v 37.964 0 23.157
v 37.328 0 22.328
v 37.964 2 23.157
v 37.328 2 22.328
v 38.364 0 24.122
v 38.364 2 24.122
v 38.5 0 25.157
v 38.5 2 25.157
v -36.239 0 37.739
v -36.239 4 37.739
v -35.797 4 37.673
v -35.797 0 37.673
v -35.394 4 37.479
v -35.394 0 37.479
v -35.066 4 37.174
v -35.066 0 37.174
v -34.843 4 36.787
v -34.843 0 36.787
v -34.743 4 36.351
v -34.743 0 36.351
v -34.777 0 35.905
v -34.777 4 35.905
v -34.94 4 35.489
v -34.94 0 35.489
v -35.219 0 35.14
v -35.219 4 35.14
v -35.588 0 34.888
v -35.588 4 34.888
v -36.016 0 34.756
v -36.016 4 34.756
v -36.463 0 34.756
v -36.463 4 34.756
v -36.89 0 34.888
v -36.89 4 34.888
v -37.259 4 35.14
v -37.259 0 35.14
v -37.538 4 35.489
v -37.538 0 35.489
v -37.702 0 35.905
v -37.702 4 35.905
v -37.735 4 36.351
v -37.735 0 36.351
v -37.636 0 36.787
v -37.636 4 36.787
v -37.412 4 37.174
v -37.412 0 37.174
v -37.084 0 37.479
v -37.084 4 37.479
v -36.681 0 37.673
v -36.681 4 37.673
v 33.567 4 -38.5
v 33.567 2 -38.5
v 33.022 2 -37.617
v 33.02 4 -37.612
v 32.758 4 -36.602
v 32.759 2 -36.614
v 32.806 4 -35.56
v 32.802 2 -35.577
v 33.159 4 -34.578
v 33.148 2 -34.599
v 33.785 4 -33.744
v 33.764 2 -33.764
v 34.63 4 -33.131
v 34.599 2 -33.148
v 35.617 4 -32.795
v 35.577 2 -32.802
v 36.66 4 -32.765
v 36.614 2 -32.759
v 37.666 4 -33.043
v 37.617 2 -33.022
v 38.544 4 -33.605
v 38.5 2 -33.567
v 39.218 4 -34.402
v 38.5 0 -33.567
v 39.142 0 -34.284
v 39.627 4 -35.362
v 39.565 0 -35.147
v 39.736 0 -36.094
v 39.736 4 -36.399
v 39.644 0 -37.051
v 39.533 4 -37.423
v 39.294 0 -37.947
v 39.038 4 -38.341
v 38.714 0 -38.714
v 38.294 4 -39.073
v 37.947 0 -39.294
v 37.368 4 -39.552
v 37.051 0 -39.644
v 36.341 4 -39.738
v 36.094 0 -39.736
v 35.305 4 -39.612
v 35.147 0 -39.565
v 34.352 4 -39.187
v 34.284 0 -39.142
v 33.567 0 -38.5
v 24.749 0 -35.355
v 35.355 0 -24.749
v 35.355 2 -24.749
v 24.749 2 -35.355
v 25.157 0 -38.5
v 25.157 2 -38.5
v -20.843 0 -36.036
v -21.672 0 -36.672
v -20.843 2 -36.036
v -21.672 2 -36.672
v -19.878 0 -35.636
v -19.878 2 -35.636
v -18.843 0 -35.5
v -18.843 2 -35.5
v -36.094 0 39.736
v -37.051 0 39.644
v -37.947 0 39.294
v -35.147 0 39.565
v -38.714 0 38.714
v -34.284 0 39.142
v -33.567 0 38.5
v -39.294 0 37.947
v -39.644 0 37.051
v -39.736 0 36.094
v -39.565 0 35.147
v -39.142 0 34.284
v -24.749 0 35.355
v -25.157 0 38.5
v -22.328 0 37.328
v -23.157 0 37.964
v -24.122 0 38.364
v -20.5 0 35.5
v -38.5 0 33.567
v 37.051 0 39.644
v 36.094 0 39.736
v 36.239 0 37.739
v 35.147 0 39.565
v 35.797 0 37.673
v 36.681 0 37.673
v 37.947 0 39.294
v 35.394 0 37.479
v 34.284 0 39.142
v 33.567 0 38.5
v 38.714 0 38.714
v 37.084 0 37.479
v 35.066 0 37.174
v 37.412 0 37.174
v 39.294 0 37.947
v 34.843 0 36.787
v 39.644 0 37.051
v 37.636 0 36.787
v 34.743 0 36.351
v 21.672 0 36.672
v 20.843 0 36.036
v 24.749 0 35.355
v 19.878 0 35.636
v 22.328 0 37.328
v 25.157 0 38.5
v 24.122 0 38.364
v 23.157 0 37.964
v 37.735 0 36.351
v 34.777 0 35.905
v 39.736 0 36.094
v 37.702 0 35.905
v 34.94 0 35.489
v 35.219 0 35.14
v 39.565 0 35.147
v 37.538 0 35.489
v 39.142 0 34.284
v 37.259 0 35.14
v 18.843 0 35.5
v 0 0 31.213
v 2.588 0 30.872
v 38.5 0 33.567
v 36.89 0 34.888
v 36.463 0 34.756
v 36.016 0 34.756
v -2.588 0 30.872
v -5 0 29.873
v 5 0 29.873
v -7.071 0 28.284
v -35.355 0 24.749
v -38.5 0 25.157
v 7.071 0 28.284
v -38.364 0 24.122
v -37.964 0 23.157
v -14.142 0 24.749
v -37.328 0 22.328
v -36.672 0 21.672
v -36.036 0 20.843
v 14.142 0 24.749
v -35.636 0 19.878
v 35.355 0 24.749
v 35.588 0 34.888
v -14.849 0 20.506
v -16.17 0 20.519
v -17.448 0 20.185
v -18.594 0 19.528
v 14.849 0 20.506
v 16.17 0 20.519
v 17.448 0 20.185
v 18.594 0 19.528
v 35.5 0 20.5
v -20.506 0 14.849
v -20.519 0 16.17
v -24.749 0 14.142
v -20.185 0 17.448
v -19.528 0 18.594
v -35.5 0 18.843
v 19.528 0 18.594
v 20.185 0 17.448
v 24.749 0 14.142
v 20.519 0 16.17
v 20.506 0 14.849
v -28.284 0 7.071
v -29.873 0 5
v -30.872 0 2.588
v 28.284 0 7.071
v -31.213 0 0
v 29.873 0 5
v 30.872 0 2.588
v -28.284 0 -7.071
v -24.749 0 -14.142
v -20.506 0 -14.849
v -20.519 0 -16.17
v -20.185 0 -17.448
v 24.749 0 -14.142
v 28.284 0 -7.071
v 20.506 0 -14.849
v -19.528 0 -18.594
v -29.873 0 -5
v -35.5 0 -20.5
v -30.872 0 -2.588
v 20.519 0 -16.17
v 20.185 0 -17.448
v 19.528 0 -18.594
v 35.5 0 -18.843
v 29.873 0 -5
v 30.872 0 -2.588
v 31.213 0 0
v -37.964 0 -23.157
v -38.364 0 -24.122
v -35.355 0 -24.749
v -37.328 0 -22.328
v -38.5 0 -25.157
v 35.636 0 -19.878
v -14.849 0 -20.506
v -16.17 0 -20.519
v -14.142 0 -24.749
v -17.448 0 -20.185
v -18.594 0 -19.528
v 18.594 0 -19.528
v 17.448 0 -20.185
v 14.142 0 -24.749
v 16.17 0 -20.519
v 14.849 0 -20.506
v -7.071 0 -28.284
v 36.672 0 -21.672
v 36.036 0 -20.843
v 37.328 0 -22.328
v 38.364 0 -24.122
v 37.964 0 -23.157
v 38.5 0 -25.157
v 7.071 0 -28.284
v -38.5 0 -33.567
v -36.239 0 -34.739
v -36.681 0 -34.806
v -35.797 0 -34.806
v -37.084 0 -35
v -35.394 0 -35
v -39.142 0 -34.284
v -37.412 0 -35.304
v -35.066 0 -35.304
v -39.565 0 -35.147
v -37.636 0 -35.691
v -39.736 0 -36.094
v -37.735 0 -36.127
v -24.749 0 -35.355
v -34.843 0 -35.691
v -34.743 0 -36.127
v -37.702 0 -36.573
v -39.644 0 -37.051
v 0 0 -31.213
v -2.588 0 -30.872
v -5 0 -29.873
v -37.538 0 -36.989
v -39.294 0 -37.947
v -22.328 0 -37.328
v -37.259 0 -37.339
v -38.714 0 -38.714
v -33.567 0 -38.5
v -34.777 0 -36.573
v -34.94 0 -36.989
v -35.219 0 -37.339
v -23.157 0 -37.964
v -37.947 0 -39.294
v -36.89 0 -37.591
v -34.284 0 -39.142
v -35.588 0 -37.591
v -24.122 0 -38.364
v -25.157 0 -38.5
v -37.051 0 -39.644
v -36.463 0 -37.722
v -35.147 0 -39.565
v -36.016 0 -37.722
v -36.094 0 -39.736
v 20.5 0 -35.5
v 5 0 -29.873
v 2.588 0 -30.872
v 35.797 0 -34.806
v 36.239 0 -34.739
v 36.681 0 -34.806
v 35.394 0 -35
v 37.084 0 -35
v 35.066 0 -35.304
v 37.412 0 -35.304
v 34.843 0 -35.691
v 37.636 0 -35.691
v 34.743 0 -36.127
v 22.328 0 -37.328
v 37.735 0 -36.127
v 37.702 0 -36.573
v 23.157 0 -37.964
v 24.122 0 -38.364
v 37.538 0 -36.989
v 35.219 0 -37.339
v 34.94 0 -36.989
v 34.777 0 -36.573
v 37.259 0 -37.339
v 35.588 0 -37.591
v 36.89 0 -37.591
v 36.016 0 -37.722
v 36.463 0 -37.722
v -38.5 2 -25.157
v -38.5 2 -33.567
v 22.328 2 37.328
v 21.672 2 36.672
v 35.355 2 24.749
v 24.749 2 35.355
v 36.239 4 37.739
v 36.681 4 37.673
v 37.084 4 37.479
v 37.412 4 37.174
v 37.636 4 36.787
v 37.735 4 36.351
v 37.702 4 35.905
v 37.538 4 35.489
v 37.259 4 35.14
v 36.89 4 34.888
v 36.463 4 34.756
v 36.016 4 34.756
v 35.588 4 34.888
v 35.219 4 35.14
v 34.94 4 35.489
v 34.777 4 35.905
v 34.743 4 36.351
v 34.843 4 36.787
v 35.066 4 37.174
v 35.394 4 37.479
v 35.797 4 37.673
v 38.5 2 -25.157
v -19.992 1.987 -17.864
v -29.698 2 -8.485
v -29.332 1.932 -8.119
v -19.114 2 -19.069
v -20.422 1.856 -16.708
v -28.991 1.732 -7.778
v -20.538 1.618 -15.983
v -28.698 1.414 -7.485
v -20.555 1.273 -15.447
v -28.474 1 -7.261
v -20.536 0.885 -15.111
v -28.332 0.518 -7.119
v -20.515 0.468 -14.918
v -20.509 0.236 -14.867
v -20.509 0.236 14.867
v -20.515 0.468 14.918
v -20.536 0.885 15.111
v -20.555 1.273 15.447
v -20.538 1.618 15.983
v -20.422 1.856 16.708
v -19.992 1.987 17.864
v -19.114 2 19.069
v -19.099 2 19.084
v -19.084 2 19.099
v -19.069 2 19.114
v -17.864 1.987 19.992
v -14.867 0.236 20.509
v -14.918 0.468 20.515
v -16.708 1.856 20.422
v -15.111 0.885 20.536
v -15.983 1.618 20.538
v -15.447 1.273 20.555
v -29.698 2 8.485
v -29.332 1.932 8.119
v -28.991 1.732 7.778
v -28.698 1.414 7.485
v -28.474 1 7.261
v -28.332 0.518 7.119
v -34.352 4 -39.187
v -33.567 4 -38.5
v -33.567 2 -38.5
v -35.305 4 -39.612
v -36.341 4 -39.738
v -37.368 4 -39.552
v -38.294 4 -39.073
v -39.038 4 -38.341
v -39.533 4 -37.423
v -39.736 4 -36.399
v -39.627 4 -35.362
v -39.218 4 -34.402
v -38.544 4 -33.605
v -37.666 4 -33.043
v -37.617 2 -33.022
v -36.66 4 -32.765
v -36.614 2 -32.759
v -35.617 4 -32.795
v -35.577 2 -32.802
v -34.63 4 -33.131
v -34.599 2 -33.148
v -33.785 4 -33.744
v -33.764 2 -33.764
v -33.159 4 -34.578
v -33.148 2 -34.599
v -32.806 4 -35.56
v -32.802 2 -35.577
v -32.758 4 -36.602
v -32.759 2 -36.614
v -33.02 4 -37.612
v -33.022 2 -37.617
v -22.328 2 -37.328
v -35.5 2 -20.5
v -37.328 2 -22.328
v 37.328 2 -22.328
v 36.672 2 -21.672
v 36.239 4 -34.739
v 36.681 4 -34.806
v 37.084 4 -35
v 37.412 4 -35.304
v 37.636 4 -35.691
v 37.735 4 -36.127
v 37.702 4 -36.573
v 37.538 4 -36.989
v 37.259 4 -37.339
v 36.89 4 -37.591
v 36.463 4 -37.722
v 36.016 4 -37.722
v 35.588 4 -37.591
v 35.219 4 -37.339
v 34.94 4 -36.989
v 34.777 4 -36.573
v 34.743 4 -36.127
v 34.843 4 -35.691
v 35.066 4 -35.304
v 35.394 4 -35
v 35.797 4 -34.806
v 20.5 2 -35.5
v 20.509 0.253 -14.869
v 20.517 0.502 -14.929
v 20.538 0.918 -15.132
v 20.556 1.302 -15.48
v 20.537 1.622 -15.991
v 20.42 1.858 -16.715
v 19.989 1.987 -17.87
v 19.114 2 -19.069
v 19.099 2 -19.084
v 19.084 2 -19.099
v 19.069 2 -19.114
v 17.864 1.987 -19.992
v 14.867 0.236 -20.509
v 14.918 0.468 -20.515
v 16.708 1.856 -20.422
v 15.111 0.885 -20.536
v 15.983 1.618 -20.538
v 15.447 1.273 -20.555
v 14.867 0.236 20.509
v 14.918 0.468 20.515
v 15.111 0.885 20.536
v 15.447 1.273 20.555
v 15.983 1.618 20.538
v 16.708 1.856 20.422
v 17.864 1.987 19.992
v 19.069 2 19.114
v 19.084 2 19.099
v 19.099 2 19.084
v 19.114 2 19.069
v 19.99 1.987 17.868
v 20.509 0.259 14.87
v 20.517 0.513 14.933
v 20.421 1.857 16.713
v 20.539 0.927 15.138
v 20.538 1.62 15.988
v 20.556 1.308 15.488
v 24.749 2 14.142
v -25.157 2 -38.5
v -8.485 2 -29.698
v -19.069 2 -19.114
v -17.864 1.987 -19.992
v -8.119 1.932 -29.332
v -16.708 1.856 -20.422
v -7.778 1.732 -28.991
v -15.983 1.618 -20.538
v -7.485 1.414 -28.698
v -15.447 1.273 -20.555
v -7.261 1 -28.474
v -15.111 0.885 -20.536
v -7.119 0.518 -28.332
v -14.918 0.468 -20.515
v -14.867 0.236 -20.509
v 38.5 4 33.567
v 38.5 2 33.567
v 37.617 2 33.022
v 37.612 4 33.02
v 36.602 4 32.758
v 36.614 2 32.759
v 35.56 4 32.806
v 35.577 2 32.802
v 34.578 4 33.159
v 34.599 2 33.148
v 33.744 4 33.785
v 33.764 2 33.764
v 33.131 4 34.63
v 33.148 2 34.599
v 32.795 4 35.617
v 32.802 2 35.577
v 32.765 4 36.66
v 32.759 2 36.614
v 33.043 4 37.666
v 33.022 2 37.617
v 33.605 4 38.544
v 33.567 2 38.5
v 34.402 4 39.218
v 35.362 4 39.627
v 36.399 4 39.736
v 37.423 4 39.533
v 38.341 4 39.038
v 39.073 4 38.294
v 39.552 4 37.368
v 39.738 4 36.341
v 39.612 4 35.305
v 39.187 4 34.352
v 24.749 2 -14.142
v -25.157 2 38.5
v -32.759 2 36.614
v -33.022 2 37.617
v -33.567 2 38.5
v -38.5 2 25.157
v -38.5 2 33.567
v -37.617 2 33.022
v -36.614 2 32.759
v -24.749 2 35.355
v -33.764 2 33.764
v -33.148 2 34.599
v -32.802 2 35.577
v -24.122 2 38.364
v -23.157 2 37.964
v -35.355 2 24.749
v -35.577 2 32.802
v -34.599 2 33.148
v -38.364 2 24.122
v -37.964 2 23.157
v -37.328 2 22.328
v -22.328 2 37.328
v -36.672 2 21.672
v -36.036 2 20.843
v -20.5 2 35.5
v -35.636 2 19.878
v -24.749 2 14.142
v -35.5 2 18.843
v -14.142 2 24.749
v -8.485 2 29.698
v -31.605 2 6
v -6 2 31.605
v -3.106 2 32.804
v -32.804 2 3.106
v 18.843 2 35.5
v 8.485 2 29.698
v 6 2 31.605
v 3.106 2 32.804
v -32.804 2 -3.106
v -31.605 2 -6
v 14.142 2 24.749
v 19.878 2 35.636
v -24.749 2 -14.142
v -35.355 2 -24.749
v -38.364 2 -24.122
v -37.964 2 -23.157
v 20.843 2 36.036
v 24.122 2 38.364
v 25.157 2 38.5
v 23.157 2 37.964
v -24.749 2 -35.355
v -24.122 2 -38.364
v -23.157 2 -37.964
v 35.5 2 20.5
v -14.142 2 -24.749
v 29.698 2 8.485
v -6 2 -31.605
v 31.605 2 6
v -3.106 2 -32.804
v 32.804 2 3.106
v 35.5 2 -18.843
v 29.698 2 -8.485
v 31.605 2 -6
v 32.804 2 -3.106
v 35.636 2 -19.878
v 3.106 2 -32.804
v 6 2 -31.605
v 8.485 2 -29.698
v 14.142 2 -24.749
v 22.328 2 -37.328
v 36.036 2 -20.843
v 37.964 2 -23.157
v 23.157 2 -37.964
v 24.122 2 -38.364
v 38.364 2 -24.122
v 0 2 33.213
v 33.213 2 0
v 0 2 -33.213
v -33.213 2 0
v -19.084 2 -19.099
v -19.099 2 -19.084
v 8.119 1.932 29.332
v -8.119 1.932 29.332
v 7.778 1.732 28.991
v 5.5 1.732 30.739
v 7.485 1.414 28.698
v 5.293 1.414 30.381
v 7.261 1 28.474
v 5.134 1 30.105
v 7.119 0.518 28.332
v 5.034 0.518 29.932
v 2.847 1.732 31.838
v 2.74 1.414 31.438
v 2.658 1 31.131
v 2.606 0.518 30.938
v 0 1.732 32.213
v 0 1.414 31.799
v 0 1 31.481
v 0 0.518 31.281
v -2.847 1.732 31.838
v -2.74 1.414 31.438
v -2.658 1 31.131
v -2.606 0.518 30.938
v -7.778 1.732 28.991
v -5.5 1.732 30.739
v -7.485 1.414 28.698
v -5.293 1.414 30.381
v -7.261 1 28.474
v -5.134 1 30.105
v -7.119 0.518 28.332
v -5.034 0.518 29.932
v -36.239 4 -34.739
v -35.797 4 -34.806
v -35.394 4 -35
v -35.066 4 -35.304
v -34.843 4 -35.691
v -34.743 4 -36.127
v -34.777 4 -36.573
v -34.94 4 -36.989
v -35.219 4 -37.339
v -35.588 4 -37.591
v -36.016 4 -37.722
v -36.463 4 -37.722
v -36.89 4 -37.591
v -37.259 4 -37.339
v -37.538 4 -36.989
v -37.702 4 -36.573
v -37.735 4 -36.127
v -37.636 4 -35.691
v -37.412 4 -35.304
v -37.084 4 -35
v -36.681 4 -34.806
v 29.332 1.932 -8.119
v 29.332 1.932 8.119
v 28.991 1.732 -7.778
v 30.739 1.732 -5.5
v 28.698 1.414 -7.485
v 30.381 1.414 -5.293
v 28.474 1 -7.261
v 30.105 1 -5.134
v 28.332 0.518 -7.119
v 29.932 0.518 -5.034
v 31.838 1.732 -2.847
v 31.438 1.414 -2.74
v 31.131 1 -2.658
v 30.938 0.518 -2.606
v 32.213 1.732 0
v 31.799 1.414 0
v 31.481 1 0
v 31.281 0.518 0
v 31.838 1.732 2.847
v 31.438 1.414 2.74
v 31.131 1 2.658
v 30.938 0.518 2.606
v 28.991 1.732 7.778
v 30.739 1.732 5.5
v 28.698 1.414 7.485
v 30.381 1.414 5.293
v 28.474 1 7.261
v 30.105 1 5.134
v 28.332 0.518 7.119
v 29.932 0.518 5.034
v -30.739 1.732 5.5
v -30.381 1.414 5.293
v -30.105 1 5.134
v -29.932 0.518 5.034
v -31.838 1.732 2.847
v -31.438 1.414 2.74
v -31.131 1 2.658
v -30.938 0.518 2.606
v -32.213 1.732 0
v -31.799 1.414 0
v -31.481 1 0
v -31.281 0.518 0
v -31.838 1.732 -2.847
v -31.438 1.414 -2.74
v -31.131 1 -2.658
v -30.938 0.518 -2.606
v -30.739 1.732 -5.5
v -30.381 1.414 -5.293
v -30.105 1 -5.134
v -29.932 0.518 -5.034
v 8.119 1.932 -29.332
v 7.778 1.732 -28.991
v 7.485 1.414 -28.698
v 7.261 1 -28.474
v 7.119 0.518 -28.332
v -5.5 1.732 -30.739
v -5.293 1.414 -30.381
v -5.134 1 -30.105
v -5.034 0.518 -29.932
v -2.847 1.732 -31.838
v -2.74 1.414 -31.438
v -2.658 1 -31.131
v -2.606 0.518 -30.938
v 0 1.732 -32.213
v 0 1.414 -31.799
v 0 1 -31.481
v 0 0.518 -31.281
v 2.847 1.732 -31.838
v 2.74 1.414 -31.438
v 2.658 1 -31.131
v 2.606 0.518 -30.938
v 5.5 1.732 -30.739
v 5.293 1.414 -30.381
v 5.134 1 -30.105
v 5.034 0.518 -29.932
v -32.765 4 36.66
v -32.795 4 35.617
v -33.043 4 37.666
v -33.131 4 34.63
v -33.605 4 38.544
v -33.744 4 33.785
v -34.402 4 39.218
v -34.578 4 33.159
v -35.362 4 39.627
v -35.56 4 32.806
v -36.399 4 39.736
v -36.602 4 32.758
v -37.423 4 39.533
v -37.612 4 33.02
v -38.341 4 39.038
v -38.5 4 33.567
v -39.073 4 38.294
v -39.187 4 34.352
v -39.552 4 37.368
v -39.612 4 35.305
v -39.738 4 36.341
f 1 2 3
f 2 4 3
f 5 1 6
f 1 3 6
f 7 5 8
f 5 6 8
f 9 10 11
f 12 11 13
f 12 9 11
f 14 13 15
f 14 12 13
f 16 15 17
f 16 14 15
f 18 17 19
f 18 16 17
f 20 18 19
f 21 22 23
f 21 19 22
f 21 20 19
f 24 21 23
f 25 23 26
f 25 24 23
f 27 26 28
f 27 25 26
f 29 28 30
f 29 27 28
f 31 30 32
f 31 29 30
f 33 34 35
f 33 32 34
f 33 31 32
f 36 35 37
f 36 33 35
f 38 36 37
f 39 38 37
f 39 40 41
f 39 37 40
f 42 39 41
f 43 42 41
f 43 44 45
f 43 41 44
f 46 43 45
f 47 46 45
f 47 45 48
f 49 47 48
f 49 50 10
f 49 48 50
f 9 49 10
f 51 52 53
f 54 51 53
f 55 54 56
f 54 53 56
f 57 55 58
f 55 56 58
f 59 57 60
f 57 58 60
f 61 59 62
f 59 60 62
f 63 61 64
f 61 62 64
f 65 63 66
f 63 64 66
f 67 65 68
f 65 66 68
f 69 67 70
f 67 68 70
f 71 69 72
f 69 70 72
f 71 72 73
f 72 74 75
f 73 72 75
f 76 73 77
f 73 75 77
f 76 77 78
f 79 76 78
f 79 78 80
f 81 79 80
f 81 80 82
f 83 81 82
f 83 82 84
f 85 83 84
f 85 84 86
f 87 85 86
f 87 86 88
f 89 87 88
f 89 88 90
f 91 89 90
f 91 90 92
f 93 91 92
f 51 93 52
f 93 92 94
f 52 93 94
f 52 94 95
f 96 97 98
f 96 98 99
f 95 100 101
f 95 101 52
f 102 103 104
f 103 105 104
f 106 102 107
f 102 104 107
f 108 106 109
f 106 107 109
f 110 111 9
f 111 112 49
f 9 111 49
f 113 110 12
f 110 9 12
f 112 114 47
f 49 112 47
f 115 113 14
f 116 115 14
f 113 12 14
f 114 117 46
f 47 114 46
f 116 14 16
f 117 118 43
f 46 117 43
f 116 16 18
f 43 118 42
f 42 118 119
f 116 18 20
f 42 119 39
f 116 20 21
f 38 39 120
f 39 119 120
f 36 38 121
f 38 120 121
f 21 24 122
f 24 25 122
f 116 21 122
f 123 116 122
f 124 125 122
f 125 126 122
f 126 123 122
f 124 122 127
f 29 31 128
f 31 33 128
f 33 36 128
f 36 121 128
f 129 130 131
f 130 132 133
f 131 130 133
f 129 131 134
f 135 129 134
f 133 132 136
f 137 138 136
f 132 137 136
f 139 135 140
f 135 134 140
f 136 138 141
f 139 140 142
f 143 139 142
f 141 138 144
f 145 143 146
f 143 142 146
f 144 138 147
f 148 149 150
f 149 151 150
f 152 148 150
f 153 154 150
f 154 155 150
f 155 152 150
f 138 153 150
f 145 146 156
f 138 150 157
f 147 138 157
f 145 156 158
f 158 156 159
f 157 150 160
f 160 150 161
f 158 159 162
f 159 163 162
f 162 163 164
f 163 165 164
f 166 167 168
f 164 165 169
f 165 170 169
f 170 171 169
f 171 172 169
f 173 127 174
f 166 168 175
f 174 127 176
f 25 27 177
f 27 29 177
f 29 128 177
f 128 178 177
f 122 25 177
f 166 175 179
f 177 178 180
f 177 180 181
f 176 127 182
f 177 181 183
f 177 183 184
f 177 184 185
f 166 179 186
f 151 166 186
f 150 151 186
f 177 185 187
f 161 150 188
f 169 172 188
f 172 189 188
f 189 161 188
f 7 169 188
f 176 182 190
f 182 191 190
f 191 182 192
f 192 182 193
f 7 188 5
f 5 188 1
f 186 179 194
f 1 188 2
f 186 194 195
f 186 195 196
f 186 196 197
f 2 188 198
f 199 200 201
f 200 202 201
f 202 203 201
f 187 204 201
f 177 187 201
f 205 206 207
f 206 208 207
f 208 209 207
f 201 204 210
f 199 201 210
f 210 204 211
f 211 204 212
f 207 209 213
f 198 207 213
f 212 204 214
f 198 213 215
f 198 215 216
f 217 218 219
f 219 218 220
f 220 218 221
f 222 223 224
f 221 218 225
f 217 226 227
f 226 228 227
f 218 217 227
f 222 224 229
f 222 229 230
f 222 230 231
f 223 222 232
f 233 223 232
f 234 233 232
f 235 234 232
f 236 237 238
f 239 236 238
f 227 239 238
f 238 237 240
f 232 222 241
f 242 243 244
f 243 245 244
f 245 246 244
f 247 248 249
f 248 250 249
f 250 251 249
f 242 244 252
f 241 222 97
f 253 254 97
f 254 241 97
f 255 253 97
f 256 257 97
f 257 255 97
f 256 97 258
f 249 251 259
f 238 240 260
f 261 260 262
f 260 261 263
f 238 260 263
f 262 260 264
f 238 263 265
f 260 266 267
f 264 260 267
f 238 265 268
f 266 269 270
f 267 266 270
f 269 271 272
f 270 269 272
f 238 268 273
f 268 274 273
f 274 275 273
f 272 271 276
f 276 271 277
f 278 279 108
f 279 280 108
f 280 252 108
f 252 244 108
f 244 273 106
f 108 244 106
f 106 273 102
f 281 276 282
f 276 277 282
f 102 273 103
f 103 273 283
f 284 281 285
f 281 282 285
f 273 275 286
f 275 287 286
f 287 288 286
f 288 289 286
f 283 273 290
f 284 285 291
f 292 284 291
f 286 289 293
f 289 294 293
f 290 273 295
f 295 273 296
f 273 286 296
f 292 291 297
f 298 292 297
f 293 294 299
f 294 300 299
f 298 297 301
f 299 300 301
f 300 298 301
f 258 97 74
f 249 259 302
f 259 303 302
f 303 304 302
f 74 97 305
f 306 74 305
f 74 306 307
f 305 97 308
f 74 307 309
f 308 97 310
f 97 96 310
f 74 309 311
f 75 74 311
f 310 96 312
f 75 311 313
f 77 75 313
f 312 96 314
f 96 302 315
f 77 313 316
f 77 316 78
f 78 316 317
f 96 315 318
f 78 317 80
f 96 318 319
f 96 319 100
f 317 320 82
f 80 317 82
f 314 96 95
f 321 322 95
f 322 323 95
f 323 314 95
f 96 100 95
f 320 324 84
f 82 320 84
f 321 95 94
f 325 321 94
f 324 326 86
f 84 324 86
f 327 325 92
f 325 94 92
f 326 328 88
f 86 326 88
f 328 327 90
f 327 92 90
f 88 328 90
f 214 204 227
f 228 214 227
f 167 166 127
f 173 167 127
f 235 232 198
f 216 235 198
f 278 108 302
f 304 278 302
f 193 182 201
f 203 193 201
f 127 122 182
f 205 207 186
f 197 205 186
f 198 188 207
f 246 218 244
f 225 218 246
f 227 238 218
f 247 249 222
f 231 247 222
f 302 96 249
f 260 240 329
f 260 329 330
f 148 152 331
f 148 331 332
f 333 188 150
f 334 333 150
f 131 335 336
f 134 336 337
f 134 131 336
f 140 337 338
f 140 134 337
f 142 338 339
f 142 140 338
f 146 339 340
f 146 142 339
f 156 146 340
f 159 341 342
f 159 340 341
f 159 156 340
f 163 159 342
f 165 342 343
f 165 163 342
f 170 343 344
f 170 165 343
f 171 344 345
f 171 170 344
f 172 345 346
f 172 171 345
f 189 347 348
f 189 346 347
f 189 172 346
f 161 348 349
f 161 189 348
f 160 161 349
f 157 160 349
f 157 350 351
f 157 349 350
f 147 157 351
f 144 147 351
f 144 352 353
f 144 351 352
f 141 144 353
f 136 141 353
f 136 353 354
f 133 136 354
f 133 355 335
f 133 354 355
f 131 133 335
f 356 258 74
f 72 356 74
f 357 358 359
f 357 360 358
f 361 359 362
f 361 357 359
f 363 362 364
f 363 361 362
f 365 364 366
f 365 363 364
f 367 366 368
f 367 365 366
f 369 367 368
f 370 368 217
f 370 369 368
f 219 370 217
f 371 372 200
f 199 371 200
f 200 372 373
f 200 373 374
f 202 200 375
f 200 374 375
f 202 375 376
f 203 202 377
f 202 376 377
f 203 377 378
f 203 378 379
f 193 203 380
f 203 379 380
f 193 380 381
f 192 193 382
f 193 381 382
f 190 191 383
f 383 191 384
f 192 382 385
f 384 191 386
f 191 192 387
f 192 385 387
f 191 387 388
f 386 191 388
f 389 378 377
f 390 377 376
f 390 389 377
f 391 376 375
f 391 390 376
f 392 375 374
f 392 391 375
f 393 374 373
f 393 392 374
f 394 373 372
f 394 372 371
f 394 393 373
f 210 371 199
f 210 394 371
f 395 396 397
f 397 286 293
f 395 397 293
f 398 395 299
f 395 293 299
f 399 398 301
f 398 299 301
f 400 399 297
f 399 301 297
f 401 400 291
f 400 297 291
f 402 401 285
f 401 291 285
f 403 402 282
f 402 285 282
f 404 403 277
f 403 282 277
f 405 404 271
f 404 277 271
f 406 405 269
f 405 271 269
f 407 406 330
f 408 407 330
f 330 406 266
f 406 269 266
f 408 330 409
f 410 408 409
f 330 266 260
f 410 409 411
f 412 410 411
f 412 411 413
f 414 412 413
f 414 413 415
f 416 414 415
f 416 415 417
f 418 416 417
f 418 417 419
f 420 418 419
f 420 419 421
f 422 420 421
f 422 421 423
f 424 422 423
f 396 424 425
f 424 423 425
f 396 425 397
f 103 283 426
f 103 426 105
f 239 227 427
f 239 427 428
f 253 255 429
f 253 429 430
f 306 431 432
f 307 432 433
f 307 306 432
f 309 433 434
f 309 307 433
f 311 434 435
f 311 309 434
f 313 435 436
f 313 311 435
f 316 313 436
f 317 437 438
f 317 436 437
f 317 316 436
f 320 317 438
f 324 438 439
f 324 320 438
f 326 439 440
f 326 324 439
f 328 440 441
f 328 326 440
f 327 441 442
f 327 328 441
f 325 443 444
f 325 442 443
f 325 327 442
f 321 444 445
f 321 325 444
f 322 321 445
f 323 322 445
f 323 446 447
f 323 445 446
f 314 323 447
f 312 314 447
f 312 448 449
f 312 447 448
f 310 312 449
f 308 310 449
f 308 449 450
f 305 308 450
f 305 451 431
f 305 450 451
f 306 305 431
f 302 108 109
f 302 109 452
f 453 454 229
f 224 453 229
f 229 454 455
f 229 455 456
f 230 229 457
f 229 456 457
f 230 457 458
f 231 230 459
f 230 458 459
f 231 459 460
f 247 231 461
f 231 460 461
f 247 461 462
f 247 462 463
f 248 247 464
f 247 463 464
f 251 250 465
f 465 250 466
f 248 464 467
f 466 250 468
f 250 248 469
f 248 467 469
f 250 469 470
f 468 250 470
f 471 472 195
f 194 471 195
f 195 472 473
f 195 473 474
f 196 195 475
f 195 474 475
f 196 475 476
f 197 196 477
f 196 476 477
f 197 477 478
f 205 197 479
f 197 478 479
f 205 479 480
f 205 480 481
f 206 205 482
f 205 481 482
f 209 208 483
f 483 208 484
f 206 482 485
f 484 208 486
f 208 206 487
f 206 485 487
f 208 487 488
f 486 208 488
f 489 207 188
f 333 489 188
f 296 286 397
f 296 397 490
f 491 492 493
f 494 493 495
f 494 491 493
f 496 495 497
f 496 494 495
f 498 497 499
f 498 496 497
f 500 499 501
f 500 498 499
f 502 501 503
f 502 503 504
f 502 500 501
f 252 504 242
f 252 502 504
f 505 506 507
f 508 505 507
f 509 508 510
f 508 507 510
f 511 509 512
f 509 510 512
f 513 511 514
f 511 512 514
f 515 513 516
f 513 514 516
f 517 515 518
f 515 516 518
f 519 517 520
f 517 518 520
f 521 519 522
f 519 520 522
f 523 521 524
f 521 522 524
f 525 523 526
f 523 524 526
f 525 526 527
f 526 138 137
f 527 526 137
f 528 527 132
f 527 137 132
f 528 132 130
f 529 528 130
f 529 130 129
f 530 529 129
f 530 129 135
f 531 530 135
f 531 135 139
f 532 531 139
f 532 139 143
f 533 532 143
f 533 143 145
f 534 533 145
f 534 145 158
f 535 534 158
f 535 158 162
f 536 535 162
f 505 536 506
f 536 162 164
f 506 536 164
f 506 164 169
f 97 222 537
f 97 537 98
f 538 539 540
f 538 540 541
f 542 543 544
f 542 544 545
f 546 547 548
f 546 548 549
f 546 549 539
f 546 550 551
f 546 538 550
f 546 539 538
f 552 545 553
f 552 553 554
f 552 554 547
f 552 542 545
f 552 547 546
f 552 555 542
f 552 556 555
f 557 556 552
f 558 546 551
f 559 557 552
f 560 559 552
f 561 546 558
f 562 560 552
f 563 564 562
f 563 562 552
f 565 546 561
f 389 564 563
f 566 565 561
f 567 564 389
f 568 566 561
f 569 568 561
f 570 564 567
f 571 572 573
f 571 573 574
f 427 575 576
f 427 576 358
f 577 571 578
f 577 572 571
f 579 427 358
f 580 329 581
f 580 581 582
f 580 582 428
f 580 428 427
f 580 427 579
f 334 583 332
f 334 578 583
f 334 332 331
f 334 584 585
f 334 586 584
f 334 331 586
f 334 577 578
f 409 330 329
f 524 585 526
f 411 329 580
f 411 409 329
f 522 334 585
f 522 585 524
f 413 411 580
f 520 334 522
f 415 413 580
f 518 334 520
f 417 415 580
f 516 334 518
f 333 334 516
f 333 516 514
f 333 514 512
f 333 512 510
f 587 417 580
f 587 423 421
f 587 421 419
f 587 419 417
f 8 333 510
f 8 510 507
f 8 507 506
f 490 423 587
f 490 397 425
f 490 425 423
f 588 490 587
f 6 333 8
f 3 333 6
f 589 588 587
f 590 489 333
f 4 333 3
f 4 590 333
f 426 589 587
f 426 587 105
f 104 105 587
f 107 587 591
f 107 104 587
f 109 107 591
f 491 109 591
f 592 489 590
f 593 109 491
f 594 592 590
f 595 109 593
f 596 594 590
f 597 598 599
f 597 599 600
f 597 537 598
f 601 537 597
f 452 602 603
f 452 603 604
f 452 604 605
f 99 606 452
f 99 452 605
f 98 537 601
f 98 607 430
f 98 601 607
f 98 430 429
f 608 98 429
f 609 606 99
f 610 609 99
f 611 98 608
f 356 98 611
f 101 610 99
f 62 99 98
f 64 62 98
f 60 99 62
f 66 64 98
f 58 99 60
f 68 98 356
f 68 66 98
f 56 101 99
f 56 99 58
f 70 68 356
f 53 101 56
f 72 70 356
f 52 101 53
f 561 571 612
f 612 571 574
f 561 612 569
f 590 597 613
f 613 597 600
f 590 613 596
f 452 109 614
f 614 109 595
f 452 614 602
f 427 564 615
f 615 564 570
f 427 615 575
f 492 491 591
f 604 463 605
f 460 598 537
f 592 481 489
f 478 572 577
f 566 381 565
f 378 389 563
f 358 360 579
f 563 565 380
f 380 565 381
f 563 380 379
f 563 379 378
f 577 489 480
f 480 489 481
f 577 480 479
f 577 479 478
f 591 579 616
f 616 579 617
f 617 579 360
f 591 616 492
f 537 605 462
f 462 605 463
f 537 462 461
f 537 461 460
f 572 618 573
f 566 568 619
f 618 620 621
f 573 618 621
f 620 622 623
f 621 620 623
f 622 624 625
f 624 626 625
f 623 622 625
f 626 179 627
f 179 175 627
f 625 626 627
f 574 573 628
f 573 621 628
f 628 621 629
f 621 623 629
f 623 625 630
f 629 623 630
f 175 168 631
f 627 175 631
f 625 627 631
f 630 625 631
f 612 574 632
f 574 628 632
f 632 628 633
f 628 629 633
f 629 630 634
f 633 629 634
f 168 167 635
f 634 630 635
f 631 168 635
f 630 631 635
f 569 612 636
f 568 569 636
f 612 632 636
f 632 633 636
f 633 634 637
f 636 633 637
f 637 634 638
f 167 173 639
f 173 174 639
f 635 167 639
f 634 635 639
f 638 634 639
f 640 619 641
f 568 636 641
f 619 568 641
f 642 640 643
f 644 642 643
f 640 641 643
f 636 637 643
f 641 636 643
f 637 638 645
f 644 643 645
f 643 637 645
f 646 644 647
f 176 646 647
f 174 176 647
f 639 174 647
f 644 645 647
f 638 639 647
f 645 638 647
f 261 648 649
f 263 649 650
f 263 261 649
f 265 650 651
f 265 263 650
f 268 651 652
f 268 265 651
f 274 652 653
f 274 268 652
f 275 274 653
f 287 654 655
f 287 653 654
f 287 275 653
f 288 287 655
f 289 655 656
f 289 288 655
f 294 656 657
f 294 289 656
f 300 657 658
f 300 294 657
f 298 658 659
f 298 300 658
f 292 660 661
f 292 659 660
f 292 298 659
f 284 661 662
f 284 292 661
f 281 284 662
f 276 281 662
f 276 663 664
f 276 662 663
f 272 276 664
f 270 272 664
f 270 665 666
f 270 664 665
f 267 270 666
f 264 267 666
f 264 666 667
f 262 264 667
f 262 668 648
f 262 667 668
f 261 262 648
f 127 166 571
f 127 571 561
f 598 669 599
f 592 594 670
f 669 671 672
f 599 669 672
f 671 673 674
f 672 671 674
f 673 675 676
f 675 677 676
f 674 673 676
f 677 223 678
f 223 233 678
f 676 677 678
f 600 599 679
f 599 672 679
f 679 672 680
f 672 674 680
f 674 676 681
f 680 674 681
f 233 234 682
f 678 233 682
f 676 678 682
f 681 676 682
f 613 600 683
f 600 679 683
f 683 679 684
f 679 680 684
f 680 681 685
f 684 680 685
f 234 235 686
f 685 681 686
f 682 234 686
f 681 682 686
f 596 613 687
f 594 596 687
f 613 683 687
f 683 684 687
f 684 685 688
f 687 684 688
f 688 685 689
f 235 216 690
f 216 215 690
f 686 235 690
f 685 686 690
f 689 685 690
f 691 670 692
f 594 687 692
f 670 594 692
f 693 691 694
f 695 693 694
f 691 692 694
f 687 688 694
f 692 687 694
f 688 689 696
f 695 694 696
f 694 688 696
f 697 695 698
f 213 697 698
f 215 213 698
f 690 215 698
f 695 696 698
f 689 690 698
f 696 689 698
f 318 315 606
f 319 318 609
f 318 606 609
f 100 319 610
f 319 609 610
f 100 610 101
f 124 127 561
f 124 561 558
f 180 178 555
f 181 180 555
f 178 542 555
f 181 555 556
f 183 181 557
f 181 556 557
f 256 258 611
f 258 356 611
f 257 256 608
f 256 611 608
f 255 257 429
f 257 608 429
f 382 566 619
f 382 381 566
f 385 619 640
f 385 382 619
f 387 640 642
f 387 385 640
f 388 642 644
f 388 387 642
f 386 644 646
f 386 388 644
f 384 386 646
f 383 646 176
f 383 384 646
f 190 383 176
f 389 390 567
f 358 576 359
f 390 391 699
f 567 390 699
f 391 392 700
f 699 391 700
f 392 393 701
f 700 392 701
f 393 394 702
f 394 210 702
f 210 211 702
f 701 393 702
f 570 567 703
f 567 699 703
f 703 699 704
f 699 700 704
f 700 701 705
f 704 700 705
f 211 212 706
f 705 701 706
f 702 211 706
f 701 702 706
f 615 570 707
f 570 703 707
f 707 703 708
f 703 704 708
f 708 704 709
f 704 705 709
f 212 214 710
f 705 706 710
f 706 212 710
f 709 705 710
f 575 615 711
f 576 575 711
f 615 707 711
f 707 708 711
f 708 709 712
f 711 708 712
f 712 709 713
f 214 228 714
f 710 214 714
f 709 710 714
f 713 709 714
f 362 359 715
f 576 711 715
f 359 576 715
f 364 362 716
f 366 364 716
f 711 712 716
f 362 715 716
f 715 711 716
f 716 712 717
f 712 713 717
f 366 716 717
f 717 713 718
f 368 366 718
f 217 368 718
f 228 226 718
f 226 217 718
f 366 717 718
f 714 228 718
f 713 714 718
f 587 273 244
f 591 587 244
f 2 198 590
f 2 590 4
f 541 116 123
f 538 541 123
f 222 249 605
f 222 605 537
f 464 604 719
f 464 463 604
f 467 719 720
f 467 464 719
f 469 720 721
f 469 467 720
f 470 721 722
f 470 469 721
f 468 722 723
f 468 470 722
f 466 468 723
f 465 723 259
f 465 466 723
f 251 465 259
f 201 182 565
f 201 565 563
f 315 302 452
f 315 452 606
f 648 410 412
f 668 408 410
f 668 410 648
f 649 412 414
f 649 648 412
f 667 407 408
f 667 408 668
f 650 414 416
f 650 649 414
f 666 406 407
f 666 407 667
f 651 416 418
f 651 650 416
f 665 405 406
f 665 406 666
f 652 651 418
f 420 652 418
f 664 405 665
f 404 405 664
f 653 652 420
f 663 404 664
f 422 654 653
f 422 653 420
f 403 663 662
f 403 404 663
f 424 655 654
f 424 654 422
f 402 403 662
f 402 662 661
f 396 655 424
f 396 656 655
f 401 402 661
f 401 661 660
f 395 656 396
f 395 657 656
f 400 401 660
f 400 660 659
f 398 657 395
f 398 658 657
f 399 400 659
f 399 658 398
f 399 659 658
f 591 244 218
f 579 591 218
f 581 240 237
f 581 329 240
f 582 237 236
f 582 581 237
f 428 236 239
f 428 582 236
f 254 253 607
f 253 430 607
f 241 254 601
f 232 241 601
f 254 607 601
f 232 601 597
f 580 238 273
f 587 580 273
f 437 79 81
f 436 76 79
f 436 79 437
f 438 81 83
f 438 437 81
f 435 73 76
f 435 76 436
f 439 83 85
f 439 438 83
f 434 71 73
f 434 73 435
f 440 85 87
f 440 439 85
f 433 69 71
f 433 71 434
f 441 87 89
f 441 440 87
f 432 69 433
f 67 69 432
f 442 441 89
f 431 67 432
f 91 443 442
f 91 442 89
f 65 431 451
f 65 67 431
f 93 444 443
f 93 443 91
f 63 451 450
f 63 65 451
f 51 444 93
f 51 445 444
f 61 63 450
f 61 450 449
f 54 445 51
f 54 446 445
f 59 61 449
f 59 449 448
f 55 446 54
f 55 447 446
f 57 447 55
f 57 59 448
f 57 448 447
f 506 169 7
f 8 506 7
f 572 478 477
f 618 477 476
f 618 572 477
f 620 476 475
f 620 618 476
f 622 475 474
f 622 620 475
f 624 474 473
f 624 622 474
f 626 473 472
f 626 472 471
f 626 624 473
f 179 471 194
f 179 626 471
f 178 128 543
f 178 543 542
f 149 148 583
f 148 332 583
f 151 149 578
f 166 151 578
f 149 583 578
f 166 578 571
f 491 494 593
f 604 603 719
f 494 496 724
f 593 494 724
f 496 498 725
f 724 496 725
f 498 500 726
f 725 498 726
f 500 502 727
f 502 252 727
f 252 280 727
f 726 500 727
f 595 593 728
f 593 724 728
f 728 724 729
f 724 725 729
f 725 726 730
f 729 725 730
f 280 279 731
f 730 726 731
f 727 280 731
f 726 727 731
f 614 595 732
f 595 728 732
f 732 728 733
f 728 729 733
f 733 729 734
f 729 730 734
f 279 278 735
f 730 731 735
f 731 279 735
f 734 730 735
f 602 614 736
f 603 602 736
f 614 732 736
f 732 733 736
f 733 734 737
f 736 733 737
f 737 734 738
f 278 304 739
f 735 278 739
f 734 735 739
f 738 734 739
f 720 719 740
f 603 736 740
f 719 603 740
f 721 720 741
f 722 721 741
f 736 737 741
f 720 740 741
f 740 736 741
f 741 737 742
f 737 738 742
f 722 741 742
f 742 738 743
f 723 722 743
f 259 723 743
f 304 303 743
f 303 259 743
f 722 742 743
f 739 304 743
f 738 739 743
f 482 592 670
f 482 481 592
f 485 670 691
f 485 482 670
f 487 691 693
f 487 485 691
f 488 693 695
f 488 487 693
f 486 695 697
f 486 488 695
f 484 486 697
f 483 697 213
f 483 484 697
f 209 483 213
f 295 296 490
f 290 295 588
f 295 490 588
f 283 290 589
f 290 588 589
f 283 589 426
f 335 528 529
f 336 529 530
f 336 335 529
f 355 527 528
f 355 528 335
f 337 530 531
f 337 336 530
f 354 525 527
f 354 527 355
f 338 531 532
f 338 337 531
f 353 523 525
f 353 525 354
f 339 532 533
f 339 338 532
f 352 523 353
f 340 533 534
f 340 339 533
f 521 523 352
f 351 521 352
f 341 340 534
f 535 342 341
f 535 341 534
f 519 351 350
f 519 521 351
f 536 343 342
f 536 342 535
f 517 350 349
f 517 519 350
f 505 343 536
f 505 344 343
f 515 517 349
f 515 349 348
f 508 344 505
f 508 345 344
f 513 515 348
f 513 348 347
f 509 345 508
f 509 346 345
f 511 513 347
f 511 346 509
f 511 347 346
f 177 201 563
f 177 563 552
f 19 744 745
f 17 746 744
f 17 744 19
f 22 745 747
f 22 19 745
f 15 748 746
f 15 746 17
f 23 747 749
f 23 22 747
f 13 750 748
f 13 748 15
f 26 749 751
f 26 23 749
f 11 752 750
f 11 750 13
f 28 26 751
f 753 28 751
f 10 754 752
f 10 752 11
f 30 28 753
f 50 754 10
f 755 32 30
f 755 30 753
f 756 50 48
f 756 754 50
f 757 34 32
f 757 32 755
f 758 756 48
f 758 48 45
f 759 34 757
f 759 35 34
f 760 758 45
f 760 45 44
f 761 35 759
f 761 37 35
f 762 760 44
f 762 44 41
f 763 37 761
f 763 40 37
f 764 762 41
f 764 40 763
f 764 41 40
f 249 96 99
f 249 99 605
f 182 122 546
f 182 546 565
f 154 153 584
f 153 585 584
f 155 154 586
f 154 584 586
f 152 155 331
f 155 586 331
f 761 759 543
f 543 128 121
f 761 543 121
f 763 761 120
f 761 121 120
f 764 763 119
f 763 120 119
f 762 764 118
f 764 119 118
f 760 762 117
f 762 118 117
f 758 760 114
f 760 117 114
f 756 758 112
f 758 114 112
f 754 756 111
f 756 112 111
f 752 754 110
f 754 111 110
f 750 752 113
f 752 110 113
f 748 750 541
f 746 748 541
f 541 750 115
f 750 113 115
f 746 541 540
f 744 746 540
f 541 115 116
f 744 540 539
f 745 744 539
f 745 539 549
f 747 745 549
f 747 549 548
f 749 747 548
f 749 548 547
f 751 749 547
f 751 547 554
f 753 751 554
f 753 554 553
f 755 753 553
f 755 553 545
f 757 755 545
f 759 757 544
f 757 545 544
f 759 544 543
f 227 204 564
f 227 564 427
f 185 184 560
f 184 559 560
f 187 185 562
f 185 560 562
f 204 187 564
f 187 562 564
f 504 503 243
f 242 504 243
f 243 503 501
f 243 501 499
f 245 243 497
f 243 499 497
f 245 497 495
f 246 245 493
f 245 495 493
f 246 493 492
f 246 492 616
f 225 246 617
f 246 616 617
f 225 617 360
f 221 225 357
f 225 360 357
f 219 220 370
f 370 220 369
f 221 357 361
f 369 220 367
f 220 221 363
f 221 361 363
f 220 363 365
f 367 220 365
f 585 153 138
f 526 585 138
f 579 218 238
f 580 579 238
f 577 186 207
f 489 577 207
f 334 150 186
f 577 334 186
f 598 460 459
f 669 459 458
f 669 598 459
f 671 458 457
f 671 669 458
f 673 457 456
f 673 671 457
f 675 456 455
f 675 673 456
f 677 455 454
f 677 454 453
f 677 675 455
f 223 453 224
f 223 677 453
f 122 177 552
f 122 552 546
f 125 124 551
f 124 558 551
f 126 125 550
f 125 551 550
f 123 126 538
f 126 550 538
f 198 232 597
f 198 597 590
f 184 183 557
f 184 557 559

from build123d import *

# Parameters (mm, degrees)
SKETCH1_W           = 77
SKETCH1_H           = 77
BOSS_EXTRUDE1_DEPTH = 2
SKETCH3_R           = 3.5
BOSS_EXTRUDE2_DEPTH = 4
SKETCH5_R           = 1.5
CUT_EXTRUDE1_DEPTH  = 57.341917038
CUT_EXTRUDE3_DEPTH  = 5
CIRPATTERN3_COUNT   = 4
FILLET3_R           = 4
CUT_EXTRUDE5_DEPTH  = 5
SKETCH6_R           = 1.5
CUT_EXTRUDE6_DEPTH  = 57.341917038
FILLET4_R           = 10
SKETCH8_R           = 5
CUT_EXTRUDE7_DEPTH  = 10
FILLET5_R           = 2


with BuildPart() as part:
    # Sketch1 → Boss-Extrude1 (new body)
    with BuildSketch(Plane(origin=(0, 0, 0), x_dir=(1, 0, 0), z_dir=(0, 1, 0))):
        Rectangle(SKETCH1_W, SKETCH1_H)
        Polygon((14.142135624, 24.748737342), (24.748737342, 14.142135624), (35.355339059, 24.748737342), (24.748737342, 35.355339059), align=None, mode=Mode.SUBTRACT)
        Polygon((-24.748737342, 14.142135624), (-35.355339059, 24.748737342), (-24.748737342, 35.355339059), (-14.142135624, 24.748737342), align=None, mode=Mode.SUBTRACT)
        Polygon((-14.142135624, -24.748737342), (-24.748737342, -14.142135624), (-35.355339059, -24.748737342), (-24.748737342, -35.355339059), align=None, mode=Mode.SUBTRACT)
        Polygon((14.142135624, -24.748737342), (24.748737342, -14.142135624), (35.355339059, -24.748737342), (24.748737342, -35.355339059), align=None, mode=Mode.SUBTRACT)
    extrude(amount=BOSS_EXTRUDE1_DEPTH)

    # Sketch3 → Boss-Extrude2 (add)
    with BuildSketch(Plane(origin=(0, 0, 0), x_dir=(1, 0, 0), z_dir=(0, 1, 0))):
        with Locations(Location((-36.239222536, 36.239222536, 0), (0, 0, 40.235921257))):
            Circle(SKETCH3_R)
        with Locations(Location((36.239222536, 36.239222536, 0), (0, 0, 139.764078743))):
            Circle(SKETCH3_R)
        with Locations(Location((-36.239222536, -36.239222536, 0), (0, 0, 130.235921257))):
            Circle(SKETCH3_R)
        with Locations(Location((36.239222536, -36.239222536, 0), (0, 0, 49.764078743))):
            Circle(SKETCH3_R)
    extrude(amount=BOSS_EXTRUDE2_DEPTH)

    # Sketch5 → Cut-Extrude1 (cut, through all)
    with BuildSketch(Plane(origin=(0, 0, 0), x_dir=(1, 0, 0), z_dir=(0, 1, 0))):
        with Locations(Location((0, 0, 0), (0, 0, 270))):
            Circle(SKETCH5_R)
    extrude(amount=CUT_EXTRUDE1_DEPTH, mode=Mode.SUBTRACT)

    # Sketch4 → Cut-Extrude3 (cut)
    with BuildSketch(Plane(origin=(0, 0, 0), x_dir=(1, 0, 0), z_dir=(0, 1, 0))):
        Polygon((-38.5, 23.5), (-38.5, -23.5), (-35.5, -20.5), (-35.5, 20.5), align=None)
    cut_extrude3 = extrude(amount=CUT_EXTRUDE3_DEPTH, mode=Mode.SUBTRACT)

    # CirPattern3: Cut-Extrude3 ×4 about axis
    cirpattern3_axis = Axis((0, 0, 0), (0, 1, 0))
    for i in range(1, CIRPATTERN3_COUNT):
        add(cut_extrude3.rotate(cirpattern3_axis, i * 360 / CIRPATTERN3_COUNT), mode=Mode.SUBTRACT)

    # Fillet3
    fillet3_edges = [part.edges().sort_by_distance(p)[0] for p in [
        (-38.5, 1, -23.5),
        (-38.5, 1, 23.5),
        (-35.5, 1, 20.5),
        (-23.5, 1, -38.5),
        (23.5, 1, -38.5),
        (-20.5, 1, -35.5),
        (38.5, 1, -23.5),
        (38.5, 1, 23.5),
        (35.5, 1, -20.5),
        (23.5, 1, 38.5),
        (-23.5, 1, 38.5),
        (20.5, 1, 35.5),
    ]]
    fillet(fillet3_edges, radius=FILLET3_R)

    # Sketch2 → Cut-Extrude5 (cut)
    with BuildSketch(Plane(origin=(0, 0, 0), x_dir=(1, 0, 0), z_dir=(0, 1, 0))):
        Polygon((35.355339059, 0), (0, 35.355339059), (-35.355339059, 0), (0, -35.355339059), align=None)
    extrude(amount=CUT_EXTRUDE5_DEPTH, mode=Mode.SUBTRACT)

    # Sketch6 → Cut-Extrude6 (cut, through all)
    with BuildSketch(Plane(origin=(0, 0, 0), x_dir=(1, 0, 0), z_dir=(0, 1, 0))):
        with Locations(Location((-36.239222536, 36.239222536, 0), (0, 0, 270))):
            Circle(SKETCH6_R)
        with Locations(Location((-36.239222536, -36.239222536, 0), (0, 0, 270))):
            Circle(SKETCH6_R)
        with Locations(Location((36.239222536, -36.239222536, 0), (0, 0, 270))):
            Circle(SKETCH6_R)
        with Locations(Location((36.239222536, 36.239222536, 0), (0, 0, 270))):
            Circle(SKETCH6_R)
    extrude(amount=CUT_EXTRUDE6_DEPTH, mode=Mode.SUBTRACT)

    # Fillet4
    fillet4_edges = [part.edges().sort_by_distance(p)[0] for p in [
        (0, 1, 35.355339059),
        (35.355339059, 1, 0),
        (0, 1, -35.355339059),
        (-35.355339059, 1, 0),
    ]]
    fillet(fillet4_edges, radius=FILLET4_R)

    # Sketch8 → Cut-Extrude7 (cut)
    with BuildSketch(Plane(origin=(0, 2, 0), x_dir=(1, 0, 0), z_dir=(0, 1, 0))):
        with Locations((15.556349186, 15.556349186)):
            Circle(SKETCH8_R)
        with Locations((-15.556349186, 15.556349186)):
            Circle(SKETCH8_R)
        with Locations((-15.556349186, -15.556349186)):
            Circle(SKETCH8_R)
        with Locations((15.556349186, -15.556349186)):
            Circle(SKETCH8_R)
    extrude(amount=-CUT_EXTRUDE7_DEPTH, mode=Mode.SUBTRACT)

    # Fillet5
    fillet5_edges = [part.edges().sort_by_distance(p)[0] for p in [
        (-24.395183951, 2, 10.960155108),
        (-24.395183951, 2, -10.960155108),
        (10.960155108, 2, 24.395183951),
        (-10.960155108, 2, 24.395183951),
        (24.395183951, 2, -10.960155108),
        (24.395183951, 2, 10.960155108),
        (-10.960155108, 2, -24.395183951),
        (10.960155108, 2, -24.395183951),
        (-31.213203436, 2, 0),
        (0, 2, 31.213203436),
        (31.213203436, 2, 0),
        (0, 2, -31.213203436),
    ]]
    fillet(fillet5_edges, radius=FILLET5_R - 0.0001)  # a hair under: the kernel refuses the full size


solid = part.part
